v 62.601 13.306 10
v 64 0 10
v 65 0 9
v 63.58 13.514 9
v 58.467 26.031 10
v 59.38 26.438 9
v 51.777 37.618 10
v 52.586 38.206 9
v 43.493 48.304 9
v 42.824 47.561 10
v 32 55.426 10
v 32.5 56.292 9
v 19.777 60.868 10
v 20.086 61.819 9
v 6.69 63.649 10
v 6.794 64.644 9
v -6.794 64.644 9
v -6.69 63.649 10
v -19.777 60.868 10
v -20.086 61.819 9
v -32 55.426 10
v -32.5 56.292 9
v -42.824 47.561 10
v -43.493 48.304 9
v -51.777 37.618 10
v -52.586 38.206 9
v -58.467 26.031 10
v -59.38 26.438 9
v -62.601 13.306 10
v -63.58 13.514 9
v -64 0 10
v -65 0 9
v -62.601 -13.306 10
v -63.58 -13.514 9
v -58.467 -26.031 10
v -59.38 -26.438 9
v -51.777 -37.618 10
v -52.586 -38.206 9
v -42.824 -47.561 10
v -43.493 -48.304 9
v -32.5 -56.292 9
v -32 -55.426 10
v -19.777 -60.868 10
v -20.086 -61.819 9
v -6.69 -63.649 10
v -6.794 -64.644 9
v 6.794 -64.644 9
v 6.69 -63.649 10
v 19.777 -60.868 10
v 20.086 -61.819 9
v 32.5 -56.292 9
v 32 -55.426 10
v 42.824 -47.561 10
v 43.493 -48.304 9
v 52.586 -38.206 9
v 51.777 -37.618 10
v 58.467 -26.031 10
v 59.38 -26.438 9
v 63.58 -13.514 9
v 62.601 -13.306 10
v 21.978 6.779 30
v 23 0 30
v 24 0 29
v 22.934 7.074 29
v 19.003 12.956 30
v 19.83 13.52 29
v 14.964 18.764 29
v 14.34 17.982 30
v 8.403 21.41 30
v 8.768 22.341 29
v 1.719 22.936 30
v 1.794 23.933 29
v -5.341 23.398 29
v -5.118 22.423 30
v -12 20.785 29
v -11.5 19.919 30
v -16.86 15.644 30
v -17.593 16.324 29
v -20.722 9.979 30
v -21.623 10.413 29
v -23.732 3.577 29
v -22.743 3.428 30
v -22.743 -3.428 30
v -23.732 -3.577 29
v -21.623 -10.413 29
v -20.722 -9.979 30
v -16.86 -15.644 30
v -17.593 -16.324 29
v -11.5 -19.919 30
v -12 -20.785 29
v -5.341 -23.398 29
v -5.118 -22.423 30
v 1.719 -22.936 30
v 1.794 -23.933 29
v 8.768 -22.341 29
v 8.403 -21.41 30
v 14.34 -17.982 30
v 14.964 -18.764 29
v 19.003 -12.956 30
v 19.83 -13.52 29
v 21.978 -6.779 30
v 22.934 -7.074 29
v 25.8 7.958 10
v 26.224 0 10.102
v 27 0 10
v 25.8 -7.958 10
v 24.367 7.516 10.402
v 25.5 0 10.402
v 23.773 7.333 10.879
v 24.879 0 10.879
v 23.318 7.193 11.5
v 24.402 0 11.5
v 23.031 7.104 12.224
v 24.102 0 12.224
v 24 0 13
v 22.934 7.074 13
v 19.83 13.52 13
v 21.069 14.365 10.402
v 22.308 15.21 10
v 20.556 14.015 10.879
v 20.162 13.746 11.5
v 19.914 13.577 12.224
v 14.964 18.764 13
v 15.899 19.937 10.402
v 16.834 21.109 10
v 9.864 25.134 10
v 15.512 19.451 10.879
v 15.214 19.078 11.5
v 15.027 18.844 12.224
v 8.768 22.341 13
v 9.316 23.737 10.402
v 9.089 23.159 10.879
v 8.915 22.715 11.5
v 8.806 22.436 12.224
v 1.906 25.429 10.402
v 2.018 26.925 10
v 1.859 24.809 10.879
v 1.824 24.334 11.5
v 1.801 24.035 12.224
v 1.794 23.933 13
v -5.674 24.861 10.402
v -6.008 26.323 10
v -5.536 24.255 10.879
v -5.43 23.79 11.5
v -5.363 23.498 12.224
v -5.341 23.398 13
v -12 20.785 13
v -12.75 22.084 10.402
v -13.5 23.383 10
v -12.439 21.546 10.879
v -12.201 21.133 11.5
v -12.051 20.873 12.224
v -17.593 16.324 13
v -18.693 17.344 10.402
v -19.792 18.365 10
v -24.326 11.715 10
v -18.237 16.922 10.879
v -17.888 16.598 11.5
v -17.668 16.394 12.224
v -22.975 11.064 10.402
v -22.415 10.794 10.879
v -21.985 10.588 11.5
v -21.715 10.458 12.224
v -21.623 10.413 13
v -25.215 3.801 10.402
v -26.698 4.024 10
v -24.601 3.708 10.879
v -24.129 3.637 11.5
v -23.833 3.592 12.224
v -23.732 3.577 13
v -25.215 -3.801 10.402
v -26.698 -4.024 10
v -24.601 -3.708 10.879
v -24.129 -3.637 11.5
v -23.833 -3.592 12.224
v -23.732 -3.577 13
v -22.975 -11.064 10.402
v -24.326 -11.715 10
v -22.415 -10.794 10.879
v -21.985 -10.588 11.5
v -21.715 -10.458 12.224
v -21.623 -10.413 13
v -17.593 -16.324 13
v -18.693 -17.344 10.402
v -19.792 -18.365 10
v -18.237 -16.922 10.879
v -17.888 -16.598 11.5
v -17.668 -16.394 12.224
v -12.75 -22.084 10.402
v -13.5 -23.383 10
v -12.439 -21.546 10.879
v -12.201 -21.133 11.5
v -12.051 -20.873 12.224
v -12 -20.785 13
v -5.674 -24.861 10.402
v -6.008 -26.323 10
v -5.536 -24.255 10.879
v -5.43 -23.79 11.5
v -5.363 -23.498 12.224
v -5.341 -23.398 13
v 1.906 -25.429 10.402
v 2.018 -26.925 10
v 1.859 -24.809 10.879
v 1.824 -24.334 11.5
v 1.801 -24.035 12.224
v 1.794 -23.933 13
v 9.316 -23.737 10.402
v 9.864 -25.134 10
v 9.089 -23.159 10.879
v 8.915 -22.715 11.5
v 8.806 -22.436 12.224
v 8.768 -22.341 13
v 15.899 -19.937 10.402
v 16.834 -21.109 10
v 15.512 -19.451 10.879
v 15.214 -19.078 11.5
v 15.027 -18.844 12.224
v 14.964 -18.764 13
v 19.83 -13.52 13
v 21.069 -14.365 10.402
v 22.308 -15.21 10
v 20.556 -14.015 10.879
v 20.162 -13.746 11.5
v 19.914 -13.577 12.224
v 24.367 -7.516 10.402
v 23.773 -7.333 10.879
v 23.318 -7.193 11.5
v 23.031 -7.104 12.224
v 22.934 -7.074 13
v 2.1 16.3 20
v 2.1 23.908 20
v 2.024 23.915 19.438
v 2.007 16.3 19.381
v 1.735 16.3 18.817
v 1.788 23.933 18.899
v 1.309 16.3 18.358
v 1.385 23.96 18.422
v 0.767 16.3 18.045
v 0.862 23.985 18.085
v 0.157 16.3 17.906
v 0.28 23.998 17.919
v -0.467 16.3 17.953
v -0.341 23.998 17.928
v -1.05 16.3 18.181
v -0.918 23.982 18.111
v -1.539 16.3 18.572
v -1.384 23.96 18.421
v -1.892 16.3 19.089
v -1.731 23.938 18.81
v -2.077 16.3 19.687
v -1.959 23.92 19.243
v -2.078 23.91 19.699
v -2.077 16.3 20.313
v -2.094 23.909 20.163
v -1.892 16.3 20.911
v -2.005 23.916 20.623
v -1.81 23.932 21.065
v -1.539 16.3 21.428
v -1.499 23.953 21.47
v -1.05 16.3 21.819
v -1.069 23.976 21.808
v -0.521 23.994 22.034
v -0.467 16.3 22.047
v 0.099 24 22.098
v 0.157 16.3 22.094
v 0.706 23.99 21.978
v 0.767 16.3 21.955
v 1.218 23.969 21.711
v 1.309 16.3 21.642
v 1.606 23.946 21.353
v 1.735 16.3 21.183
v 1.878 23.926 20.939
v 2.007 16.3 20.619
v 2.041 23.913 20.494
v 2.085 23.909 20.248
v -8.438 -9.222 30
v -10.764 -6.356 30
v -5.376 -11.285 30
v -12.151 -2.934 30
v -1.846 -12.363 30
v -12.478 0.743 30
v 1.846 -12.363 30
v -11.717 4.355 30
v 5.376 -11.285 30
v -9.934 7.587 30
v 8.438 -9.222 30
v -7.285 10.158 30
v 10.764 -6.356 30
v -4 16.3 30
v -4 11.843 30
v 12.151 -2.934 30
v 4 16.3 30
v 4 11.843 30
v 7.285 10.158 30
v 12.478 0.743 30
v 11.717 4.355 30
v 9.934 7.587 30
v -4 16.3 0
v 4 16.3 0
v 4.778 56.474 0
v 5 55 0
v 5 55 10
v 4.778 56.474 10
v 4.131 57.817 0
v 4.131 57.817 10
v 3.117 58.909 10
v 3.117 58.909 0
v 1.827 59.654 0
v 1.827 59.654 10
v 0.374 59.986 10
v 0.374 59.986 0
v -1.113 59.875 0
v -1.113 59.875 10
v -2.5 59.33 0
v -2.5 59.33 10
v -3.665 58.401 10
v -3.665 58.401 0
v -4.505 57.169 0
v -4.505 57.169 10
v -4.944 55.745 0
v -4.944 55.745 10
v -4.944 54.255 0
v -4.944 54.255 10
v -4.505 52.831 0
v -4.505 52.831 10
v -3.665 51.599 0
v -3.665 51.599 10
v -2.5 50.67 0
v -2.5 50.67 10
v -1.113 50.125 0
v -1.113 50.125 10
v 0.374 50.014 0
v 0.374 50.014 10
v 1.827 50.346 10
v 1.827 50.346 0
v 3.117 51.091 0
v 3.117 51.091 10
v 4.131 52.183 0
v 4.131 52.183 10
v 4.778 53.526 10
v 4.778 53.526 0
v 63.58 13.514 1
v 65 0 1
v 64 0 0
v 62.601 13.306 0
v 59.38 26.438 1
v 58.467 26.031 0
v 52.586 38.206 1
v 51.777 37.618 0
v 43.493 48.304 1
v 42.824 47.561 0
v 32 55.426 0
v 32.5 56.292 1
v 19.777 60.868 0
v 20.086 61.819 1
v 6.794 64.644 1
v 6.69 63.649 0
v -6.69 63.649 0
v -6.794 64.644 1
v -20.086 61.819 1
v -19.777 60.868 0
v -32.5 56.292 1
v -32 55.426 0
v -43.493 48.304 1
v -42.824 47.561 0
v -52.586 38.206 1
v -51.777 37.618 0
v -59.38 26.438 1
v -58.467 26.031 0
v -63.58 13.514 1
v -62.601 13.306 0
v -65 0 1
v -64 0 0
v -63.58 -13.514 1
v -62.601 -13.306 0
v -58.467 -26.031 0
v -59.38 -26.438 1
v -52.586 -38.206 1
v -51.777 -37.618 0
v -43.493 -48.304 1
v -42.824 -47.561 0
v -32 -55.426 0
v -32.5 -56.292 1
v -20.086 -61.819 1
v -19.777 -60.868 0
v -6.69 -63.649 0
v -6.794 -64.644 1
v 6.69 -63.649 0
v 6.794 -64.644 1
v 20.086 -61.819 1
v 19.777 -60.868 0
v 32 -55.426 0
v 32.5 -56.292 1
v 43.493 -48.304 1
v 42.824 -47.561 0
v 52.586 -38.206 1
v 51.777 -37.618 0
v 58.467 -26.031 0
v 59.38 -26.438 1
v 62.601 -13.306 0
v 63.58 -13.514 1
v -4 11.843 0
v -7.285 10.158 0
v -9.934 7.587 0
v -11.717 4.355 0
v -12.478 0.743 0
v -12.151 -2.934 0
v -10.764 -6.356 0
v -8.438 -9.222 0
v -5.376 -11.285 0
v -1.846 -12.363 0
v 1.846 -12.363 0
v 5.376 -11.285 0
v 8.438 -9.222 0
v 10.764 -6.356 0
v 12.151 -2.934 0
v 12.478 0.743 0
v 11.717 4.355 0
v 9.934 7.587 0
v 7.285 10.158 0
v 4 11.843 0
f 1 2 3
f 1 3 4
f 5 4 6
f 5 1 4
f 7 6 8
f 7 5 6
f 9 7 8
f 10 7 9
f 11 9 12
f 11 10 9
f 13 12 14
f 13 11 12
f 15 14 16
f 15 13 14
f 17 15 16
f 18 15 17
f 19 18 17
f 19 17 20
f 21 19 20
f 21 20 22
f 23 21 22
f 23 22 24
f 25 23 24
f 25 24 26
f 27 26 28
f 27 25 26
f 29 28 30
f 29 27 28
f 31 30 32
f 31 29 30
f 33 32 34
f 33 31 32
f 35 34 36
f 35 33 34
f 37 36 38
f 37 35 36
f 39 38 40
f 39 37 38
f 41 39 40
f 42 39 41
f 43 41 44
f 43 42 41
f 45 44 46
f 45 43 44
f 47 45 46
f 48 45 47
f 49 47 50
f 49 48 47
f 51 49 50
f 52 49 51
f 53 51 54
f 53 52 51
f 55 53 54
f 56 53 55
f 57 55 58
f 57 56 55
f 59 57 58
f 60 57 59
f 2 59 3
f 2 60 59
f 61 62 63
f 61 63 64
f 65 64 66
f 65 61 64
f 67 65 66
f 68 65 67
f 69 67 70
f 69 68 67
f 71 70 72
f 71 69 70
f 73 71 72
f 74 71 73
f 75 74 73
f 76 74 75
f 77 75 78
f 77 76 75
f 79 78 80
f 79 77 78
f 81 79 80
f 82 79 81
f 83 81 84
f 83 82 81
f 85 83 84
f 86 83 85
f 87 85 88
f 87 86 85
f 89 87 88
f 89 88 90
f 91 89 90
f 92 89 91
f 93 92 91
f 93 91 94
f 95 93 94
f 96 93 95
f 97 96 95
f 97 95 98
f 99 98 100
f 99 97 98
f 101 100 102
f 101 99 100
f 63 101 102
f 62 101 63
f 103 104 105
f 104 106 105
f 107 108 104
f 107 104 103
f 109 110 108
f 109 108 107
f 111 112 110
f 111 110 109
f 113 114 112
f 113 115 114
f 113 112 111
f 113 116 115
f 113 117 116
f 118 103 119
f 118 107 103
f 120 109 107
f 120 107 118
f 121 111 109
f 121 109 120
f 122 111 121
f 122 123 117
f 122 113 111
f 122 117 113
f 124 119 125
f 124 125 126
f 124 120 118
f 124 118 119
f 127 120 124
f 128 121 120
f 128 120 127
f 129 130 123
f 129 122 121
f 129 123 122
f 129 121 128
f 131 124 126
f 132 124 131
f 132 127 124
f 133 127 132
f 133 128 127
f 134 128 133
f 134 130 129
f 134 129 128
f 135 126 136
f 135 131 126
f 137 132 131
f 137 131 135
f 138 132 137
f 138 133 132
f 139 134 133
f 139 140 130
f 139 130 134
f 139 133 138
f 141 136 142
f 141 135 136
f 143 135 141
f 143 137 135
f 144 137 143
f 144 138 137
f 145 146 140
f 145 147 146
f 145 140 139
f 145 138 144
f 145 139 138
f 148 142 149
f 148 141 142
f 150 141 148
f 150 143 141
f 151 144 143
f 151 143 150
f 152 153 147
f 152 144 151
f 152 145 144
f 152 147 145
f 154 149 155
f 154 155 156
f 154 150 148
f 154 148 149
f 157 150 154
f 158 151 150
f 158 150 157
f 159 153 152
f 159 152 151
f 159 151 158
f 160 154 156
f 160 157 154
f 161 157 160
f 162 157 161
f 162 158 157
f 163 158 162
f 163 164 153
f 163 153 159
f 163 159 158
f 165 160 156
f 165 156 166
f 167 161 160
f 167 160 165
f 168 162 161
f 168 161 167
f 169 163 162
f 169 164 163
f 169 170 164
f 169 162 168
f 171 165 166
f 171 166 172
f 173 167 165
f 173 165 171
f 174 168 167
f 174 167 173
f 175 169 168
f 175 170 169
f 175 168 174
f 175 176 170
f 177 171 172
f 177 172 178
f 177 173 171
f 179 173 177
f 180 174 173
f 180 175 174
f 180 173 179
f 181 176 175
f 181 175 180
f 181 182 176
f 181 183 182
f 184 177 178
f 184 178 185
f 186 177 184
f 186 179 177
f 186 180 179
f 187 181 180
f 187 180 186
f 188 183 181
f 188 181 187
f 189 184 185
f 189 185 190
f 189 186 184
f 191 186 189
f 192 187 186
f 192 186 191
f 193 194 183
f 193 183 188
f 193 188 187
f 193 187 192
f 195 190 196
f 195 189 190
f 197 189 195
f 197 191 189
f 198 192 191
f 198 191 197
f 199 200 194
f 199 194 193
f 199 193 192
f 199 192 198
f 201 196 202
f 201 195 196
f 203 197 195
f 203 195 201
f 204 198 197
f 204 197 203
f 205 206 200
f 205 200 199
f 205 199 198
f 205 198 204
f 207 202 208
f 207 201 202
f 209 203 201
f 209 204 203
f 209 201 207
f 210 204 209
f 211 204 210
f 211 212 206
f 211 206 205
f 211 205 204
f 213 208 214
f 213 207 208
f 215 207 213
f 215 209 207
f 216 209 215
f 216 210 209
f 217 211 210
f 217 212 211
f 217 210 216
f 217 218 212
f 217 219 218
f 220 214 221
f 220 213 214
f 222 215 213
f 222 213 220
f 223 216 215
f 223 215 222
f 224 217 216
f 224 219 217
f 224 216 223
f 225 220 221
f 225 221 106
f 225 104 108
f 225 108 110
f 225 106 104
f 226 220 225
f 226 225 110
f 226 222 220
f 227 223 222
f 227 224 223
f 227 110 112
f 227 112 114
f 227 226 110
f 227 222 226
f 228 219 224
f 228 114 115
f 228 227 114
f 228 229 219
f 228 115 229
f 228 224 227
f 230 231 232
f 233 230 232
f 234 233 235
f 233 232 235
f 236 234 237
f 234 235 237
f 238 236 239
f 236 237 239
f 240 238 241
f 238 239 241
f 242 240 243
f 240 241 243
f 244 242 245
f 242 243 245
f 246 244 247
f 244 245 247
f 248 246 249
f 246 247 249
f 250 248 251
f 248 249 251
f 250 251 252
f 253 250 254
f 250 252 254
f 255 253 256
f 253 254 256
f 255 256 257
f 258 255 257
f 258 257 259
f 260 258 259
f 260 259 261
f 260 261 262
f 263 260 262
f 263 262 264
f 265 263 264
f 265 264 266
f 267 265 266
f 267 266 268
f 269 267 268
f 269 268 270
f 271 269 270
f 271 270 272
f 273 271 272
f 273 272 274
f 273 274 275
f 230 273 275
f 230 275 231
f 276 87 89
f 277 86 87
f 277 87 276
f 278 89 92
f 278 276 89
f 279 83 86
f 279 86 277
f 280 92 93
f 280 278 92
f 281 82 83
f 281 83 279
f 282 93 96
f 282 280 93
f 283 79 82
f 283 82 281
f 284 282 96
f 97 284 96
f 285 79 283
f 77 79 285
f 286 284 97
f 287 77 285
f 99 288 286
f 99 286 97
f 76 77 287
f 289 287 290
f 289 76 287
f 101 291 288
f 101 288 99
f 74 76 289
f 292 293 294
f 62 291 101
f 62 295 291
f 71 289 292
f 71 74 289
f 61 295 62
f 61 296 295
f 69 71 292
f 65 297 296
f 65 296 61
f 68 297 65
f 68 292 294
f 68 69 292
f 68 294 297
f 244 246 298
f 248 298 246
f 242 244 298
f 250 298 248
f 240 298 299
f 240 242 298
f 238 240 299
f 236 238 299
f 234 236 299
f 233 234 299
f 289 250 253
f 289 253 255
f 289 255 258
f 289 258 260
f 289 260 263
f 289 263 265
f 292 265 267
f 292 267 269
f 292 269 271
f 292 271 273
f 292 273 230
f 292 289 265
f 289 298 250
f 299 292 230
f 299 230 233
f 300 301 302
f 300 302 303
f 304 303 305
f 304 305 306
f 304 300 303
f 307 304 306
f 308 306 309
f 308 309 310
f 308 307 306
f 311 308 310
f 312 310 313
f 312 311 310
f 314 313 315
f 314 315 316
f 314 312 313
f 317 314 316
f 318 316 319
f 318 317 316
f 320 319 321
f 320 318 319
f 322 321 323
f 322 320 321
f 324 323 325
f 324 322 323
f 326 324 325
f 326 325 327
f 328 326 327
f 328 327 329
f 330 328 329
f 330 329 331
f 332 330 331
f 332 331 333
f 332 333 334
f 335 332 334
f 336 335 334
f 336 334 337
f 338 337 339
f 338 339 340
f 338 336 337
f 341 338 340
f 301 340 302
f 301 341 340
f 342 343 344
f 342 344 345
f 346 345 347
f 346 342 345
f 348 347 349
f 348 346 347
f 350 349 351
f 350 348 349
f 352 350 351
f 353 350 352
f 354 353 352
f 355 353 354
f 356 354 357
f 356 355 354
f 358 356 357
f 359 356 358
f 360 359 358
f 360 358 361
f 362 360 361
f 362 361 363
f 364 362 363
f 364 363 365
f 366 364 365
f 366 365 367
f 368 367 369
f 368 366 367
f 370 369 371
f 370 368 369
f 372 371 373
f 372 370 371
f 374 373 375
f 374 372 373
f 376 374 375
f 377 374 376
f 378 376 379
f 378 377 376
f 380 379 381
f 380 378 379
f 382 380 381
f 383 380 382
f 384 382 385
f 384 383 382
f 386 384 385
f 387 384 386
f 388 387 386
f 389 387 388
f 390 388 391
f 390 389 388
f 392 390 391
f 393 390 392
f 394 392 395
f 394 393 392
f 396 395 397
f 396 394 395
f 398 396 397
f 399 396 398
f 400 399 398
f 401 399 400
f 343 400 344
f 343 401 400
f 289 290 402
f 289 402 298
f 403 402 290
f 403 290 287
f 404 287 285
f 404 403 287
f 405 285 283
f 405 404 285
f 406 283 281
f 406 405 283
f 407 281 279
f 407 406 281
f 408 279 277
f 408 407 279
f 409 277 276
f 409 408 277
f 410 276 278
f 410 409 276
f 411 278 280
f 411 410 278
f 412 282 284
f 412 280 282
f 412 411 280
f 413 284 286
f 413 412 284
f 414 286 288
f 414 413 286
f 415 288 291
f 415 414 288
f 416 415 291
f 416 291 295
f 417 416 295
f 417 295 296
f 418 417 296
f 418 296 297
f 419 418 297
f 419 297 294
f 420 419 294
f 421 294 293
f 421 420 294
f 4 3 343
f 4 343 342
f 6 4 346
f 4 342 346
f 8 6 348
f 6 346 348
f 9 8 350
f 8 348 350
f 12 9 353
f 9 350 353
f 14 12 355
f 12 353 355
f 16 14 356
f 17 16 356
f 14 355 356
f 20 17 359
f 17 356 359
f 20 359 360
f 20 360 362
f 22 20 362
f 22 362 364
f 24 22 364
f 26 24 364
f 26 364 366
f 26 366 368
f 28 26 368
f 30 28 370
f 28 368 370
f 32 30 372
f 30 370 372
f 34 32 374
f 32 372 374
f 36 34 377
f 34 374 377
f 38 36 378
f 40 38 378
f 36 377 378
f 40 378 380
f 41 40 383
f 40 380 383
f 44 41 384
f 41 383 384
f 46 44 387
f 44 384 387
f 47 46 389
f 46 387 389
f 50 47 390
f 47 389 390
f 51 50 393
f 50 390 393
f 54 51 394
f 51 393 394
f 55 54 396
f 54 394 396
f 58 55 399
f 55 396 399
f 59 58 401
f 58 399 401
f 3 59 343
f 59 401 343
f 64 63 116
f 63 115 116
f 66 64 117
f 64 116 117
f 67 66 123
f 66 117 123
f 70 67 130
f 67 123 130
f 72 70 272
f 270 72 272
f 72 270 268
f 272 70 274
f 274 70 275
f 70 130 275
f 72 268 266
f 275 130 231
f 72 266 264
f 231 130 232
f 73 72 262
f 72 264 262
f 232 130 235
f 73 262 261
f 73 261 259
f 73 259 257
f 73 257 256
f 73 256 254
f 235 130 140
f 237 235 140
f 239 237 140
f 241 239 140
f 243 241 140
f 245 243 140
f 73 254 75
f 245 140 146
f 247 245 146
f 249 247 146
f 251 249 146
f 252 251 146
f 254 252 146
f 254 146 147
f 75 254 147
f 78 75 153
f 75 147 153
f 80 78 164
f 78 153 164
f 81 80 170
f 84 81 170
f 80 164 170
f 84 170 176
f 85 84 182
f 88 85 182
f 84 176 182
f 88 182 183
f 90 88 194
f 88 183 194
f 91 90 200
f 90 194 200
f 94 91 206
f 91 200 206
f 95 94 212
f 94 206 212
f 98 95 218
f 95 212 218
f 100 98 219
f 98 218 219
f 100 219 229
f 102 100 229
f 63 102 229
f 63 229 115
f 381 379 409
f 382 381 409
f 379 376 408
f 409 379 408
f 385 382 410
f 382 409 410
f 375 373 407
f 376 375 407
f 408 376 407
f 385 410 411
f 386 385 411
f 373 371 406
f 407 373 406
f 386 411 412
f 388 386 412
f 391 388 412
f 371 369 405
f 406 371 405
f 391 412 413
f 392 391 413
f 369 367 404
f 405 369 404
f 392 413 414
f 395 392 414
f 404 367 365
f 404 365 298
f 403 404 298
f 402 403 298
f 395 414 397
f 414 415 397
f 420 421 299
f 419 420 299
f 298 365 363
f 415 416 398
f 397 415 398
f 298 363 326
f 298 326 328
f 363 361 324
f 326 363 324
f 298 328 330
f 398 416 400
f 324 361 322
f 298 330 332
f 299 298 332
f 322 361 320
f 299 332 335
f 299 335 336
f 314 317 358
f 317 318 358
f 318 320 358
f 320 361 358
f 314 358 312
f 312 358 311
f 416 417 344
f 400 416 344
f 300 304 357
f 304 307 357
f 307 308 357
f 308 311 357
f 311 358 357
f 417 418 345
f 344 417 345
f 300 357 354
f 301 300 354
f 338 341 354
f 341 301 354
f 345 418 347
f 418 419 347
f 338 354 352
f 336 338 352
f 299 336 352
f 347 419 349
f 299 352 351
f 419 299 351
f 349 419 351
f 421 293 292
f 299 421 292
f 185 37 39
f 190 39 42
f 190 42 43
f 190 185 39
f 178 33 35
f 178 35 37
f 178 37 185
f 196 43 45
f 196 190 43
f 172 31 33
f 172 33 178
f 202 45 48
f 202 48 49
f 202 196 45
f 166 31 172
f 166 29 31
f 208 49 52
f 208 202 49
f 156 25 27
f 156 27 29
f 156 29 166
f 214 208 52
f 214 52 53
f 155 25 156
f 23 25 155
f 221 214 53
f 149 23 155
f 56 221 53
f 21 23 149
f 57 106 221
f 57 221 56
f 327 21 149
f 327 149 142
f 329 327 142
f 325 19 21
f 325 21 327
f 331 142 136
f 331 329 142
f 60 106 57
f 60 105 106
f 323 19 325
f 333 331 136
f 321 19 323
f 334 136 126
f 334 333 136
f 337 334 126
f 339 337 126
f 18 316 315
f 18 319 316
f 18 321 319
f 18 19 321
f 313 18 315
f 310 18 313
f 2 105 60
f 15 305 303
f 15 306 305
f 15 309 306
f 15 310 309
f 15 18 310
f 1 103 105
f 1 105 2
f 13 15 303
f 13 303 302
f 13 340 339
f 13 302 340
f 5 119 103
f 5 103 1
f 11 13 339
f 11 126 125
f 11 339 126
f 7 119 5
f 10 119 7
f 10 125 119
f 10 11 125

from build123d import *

# Parameters (mm, degrees)
SKETCH1_R             = 65
SKETCH1_R_2           = 5
SKETCH1_R_3           = 12.5
BOSS_EXTRUDE1_DEPTH   = 10
SKETCH2_R             = 24
SKETCH2_R_2           = 12.5
BOSS_EXTRUDE2_DEPTH   = 20
CHAMFER1_SIZE         = 1
FILLET1_R             = 3
CHAMFER2_SIZE         = 1
SKETCH4_W             = 8
SKETCH4_H             = 16.3
CUT_EXTRUDE2_DEPTH    = 97.695398029
M5_TAPPED_HOLE1_D     = 4.2
M5_TAPPED_HOLE1_DEPTH = 12.4
M5_TAPPED_HOLE1_TIP   = 1.2618073


with BuildPart() as part:
    # Sketch1 → Boss-Extrude1 (new body)
    with BuildSketch(Plane.XY):
        Circle(SKETCH1_R)
        with Locations((0, 55)):
            Circle(SKETCH1_R_2, mode=Mode.SUBTRACT)
        Circle(SKETCH1_R_3, mode=Mode.SUBTRACT)
    extrude(amount=BOSS_EXTRUDE1_DEPTH)

    # Sketch2 → Boss-Extrude2 (add)
    with BuildSketch(Plane.XY.offset(10)):
        Circle(SKETCH2_R)
        Circle(SKETCH2_R_2, mode=Mode.SUBTRACT)
    extrude(amount=BOSS_EXTRUDE2_DEPTH)

    # Chamfer1
    chamfer1_edges = [part.edges().sort_by_distance(p)[0] for p in [
        (-65, 0, 0),
        (-65, 0, 10),
    ]]
    chamfer(chamfer1_edges, length=CHAMFER1_SIZE)

    # Fillet1
    fillet1_edges = [part.edges().sort_by_distance(p)[0] for p in [
        (-24, 0, 10),
    ]]
    fillet(fillet1_edges, radius=FILLET1_R)

    # Chamfer2
    chamfer2_edges = [part.edges().sort_by_distance(p)[0] for p in [
        (-24, 0, 30),
    ]]
    chamfer(chamfer2_edges, length=CHAMFER2_SIZE)

    # Sketch4 → Cut-Extrude2 (cut, through all)
    with BuildSketch(Plane.XY.offset(30)):
        with Locations((0, 8.15)):
            Rectangle(SKETCH4_W, SKETCH4_H)
    extrude(amount=-CUT_EXTRUDE2_DEPTH, mode=Mode.SUBTRACT)

    # M5 Tapped Hole1
    with Locations(Plane(origin=(0, 16.3, 0), x_dir=(-1, 0, 0), z_dir=(0, -1, 0))):
        with Locations((0, -20)):
            Hole(M5_TAPPED_HOLE1_D / 2, depth=M5_TAPPED_HOLE1_DEPTH)
            with Locations((0, 0, -(M5_TAPPED_HOLE1_DEPTH + M5_TAPPED_HOLE1_TIP / 2))):  # 118° drill point
                Cone(0, M5_TAPPED_HOLE1_D / 2, M5_TAPPED_HOLE1_TIP, mode=Mode.SUBTRACT)


solid = part.part
